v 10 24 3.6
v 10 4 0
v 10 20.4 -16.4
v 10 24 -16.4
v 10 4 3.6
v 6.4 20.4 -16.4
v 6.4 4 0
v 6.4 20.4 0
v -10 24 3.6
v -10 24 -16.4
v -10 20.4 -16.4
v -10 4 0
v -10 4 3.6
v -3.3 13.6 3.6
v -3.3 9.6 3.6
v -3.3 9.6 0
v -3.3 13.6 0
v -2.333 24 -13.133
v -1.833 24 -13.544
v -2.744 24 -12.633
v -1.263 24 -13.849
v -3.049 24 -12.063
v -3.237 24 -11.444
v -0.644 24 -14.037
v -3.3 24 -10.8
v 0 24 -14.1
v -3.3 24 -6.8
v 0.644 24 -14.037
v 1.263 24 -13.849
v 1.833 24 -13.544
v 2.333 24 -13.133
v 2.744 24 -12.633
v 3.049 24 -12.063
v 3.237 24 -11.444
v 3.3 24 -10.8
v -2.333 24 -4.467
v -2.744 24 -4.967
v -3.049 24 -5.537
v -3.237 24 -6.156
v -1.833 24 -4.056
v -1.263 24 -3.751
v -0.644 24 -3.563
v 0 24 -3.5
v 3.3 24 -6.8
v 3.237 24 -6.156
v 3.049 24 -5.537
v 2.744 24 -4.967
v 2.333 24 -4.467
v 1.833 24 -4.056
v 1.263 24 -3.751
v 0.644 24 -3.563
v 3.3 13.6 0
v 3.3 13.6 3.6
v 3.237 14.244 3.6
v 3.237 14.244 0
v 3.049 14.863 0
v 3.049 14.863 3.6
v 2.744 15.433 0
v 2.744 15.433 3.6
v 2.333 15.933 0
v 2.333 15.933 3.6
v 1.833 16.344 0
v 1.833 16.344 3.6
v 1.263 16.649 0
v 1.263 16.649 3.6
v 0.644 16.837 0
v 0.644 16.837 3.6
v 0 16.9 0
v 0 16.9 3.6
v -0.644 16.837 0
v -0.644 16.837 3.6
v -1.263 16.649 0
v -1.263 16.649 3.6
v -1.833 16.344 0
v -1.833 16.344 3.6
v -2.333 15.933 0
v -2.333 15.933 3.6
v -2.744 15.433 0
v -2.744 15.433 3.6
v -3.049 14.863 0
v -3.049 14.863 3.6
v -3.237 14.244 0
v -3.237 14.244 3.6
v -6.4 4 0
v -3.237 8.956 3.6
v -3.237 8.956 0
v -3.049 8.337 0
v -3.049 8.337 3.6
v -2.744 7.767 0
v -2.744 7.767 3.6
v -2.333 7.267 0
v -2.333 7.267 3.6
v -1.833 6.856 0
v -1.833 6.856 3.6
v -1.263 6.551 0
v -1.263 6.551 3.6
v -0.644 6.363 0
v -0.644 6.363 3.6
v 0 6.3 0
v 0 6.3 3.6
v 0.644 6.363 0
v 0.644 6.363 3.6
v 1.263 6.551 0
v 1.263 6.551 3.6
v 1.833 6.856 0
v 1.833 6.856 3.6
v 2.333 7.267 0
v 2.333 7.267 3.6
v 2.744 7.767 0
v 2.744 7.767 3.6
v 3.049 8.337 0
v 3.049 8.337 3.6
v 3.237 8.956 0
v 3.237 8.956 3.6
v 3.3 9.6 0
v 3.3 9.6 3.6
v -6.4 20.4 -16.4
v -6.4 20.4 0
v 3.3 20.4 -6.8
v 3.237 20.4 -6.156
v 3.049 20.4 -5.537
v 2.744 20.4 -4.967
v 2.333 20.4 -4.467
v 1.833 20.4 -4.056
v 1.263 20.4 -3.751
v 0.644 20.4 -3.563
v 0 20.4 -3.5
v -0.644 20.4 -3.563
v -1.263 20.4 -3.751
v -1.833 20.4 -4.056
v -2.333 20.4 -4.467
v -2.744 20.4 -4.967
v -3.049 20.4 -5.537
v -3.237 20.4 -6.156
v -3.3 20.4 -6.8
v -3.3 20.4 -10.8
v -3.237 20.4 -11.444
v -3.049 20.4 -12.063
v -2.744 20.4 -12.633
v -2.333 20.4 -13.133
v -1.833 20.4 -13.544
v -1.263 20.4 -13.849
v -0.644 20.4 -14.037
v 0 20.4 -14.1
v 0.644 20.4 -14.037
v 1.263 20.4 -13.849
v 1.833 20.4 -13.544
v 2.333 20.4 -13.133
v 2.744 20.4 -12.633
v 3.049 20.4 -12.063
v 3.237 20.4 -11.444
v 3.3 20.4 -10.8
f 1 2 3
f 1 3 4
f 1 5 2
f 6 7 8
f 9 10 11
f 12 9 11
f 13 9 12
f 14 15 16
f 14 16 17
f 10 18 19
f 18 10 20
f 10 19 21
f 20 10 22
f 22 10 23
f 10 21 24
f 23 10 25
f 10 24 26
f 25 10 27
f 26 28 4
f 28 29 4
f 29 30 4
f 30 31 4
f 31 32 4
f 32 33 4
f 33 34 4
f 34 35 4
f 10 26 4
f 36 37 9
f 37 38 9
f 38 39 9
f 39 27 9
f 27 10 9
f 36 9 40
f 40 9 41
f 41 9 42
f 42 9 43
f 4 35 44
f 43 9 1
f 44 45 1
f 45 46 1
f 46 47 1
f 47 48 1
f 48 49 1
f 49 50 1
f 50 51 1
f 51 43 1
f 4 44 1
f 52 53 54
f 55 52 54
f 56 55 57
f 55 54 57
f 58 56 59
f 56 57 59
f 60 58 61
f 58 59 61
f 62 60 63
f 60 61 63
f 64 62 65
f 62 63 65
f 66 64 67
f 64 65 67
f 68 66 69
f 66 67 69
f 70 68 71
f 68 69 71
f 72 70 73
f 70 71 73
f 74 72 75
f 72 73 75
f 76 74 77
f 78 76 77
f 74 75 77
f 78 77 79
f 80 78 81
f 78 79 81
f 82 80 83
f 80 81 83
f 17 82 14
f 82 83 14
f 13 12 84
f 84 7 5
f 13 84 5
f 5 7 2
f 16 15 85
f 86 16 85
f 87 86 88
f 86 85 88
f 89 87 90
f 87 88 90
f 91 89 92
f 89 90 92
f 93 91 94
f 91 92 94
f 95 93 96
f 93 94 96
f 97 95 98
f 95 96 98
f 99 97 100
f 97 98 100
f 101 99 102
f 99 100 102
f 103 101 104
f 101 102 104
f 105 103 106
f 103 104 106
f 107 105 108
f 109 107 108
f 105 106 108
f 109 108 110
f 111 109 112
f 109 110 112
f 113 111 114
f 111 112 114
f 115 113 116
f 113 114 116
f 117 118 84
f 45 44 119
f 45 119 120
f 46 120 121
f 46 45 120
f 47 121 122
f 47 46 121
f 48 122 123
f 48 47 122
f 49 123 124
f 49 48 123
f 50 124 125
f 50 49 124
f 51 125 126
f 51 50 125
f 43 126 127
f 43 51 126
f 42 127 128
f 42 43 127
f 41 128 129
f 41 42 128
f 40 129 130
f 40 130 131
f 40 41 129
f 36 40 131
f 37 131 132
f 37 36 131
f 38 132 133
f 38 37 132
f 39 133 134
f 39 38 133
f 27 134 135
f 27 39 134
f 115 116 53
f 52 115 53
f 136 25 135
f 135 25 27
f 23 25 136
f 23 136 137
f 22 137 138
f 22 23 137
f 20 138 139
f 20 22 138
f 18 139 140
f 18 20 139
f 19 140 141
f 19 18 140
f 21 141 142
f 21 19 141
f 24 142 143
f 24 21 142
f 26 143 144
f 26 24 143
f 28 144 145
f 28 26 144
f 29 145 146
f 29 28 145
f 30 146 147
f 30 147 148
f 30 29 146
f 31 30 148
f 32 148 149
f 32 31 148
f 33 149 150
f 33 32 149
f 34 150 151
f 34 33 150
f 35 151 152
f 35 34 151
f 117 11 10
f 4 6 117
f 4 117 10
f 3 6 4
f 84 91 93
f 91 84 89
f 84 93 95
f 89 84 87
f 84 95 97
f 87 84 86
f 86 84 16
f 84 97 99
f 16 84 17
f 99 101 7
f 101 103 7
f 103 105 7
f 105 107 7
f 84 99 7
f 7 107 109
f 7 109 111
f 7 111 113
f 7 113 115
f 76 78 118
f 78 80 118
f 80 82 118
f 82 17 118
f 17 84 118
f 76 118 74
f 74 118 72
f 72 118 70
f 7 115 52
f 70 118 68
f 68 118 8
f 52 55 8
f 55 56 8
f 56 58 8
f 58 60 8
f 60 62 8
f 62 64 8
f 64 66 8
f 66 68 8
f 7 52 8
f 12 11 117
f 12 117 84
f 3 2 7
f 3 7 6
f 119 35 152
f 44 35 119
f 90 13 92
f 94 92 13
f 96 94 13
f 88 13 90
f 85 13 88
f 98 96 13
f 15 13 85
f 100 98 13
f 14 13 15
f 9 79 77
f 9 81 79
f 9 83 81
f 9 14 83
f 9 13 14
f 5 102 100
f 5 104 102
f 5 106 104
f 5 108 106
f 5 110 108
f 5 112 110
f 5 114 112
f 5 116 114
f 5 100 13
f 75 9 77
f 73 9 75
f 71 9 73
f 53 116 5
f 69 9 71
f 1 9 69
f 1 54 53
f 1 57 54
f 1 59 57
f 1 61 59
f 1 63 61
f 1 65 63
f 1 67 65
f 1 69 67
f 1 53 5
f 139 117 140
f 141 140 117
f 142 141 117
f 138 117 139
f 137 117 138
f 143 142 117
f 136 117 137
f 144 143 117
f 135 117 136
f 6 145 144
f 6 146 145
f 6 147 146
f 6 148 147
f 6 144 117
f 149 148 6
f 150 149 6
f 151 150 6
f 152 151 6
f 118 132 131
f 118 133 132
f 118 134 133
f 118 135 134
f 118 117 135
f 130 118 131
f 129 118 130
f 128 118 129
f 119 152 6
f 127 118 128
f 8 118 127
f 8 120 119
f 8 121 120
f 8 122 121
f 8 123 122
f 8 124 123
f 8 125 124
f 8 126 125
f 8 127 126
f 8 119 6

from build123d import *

# Parameters (mm, degrees)
F0_W      = 20
F0_H      = 20
F1_DEPTH  = 3.6
F2_W      = 6.6
F2_H      = 4
F3_DEPTH  = 25
F5_ANGLE  = 90
F8_DEPTH  = 3.6
F10_DEPTH = 3.6


with BuildPart() as f1:
    # F0 (on Top) → F1 (new body)
    with BuildSketch(Plane.XY):
        with Locations((0, 14)):
            Rectangle(F0_W, F0_H)
    extrude(amount=F1_DEPTH)

    # F2 (on face) → F3 (cut)
    with BuildSketch(Plane.XY.offset(3.6)):
        with BuildLine():
            ThreePointArc((3.3, 13.6), (0, 16.9), (-3.3, 13.6))
            Line((-3.3, 13.6), (3.3, 13.6))
        make_face()
        with Locations((0, 11.6)):
            Rectangle(F2_W, F2_H)
        with BuildLine():
            Line((3.3, 9.6), (-3.3, 9.6))
            ThreePointArc((-3.3, 9.6), (0, 6.3), (3.3, 9.6))
        make_face()
    extrude(amount=-F3_DEPTH, mode=Mode.SUBTRACT)


with BuildPart() as f4_1:
    # F4: instance of F1
    add(f1.part.mirror(Plane(origin=(0, 24, 1.8), x_dir=(-1, 0, 0), z_dir=(0, 1, 0))))


with BuildPart() as f4_1_1:
    # F5: moved
    add(f4_1.part.rotate(Axis((0, 24, 3.6), (-1, 0, 0)), F5_ANGLE))


with BuildPart() as f1_1:
    add(f1.part)

    # F6: union F4_1
    add(f4_1_1.part)

    # F7 (on face) → F8 (join)
    with BuildSketch(Plane.YZ.offset(10)):
        Polygon((20.4, 0), (4, 0), (20.4, -16.4), align=None)
    extrude(amount=-F8_DEPTH)

    # F9 (on face) → F10 (join)
    with BuildSketch(Plane(origin=(-10, 0, 0), x_dir=(0, -1, 0), z_dir=(-1, 0, 0))):
        Polygon((-20.4, -16.4), (-4, 0), (-20.4, 0), align=None)
    extrude(amount=-F10_DEPTH)


solid = f1_1.part
